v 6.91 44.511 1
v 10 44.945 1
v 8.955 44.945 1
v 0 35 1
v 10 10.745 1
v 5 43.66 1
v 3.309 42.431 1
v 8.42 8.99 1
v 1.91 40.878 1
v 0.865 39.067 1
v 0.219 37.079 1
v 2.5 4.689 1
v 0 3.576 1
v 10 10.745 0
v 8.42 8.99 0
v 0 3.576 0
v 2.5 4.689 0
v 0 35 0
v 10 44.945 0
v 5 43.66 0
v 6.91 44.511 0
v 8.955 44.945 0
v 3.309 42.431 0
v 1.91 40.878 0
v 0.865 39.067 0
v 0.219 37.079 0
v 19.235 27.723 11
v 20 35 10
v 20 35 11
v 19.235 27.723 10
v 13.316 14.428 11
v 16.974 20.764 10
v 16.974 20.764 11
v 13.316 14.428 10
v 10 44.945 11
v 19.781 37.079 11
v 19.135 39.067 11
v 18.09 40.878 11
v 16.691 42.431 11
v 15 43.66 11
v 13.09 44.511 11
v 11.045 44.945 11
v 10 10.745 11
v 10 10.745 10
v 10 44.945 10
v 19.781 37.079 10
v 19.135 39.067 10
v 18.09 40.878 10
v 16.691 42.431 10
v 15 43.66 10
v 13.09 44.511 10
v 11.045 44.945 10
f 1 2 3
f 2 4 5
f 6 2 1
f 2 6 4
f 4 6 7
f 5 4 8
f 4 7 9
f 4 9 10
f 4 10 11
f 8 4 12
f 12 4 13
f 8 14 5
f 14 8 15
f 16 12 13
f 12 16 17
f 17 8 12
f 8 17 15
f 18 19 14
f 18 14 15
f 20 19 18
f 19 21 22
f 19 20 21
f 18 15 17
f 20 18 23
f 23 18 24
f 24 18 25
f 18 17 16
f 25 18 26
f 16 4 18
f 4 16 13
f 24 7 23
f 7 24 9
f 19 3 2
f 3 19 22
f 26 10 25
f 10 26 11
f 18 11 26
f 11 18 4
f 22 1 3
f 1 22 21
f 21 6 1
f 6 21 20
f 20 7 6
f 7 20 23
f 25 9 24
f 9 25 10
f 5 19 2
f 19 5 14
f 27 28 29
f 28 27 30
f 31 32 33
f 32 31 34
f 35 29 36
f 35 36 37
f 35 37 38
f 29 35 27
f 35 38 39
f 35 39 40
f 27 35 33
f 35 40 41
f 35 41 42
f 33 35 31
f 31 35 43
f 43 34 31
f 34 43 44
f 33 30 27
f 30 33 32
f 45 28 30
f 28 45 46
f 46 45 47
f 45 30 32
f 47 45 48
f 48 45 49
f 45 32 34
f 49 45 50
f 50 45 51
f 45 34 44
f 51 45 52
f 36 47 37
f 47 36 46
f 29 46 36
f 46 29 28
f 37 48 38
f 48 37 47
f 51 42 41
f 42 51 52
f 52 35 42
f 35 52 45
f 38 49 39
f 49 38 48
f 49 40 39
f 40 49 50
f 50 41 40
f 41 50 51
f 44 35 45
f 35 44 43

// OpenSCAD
module hcore () translate([0,35,0]) {
    translate([10,0,0]) cylinder(1,10,10);
    intersection() {
        translate([-15,0,0]) cylinder(1,35, 35);
        translate([0,-70,0]) cube([40,70,1]);
    };
}

module core1 () intersection() {
    hcore();
    cube([10,50,1]);
}

module core2 () intersection() {
    hcore();
    translate([10,0,0]) cube([10,50,1]);
}

core1();
translate([0,0,10]) core2();

//module core1 () {
//    intersection () {
//        hcore();
//        translate([-20,-40,0]) cube([10,50,20]);
//    }
//}
//module core2 () {
//    intersection () {
//        hcore();
//        translate([-10,-40,0]) cube([10,50,20]);
//    }
//}
//
//module coreL () intersection() {
//    hcore();
//    rotate([0,45,0]) translate([-30,-40,0]) cube([30,50,1]);
//}
//module coreR () mirror([1,0,0]) coreL();
//
//module coreLL () intersection() {
//    coreL();
//    translate([-20,-40,0]) cube([10,50,20]);
//}    
//
//module coreLC () intersection() {
//    coreL();
//    translate([-10,-40,0]) cube([10,50,20]);
//}    
//
//module coreRR () intersection() {
//    coreR();
//    translate([10,-40,0]) cube([10,50,20]);
//}
//module coreRC () intersection() {
//    coreR();
//    translate([0,-40,0]) cube([10,50,20]);
//}
////coreLL();
////coreLC();
////coreRC();
////coreRR();
//
